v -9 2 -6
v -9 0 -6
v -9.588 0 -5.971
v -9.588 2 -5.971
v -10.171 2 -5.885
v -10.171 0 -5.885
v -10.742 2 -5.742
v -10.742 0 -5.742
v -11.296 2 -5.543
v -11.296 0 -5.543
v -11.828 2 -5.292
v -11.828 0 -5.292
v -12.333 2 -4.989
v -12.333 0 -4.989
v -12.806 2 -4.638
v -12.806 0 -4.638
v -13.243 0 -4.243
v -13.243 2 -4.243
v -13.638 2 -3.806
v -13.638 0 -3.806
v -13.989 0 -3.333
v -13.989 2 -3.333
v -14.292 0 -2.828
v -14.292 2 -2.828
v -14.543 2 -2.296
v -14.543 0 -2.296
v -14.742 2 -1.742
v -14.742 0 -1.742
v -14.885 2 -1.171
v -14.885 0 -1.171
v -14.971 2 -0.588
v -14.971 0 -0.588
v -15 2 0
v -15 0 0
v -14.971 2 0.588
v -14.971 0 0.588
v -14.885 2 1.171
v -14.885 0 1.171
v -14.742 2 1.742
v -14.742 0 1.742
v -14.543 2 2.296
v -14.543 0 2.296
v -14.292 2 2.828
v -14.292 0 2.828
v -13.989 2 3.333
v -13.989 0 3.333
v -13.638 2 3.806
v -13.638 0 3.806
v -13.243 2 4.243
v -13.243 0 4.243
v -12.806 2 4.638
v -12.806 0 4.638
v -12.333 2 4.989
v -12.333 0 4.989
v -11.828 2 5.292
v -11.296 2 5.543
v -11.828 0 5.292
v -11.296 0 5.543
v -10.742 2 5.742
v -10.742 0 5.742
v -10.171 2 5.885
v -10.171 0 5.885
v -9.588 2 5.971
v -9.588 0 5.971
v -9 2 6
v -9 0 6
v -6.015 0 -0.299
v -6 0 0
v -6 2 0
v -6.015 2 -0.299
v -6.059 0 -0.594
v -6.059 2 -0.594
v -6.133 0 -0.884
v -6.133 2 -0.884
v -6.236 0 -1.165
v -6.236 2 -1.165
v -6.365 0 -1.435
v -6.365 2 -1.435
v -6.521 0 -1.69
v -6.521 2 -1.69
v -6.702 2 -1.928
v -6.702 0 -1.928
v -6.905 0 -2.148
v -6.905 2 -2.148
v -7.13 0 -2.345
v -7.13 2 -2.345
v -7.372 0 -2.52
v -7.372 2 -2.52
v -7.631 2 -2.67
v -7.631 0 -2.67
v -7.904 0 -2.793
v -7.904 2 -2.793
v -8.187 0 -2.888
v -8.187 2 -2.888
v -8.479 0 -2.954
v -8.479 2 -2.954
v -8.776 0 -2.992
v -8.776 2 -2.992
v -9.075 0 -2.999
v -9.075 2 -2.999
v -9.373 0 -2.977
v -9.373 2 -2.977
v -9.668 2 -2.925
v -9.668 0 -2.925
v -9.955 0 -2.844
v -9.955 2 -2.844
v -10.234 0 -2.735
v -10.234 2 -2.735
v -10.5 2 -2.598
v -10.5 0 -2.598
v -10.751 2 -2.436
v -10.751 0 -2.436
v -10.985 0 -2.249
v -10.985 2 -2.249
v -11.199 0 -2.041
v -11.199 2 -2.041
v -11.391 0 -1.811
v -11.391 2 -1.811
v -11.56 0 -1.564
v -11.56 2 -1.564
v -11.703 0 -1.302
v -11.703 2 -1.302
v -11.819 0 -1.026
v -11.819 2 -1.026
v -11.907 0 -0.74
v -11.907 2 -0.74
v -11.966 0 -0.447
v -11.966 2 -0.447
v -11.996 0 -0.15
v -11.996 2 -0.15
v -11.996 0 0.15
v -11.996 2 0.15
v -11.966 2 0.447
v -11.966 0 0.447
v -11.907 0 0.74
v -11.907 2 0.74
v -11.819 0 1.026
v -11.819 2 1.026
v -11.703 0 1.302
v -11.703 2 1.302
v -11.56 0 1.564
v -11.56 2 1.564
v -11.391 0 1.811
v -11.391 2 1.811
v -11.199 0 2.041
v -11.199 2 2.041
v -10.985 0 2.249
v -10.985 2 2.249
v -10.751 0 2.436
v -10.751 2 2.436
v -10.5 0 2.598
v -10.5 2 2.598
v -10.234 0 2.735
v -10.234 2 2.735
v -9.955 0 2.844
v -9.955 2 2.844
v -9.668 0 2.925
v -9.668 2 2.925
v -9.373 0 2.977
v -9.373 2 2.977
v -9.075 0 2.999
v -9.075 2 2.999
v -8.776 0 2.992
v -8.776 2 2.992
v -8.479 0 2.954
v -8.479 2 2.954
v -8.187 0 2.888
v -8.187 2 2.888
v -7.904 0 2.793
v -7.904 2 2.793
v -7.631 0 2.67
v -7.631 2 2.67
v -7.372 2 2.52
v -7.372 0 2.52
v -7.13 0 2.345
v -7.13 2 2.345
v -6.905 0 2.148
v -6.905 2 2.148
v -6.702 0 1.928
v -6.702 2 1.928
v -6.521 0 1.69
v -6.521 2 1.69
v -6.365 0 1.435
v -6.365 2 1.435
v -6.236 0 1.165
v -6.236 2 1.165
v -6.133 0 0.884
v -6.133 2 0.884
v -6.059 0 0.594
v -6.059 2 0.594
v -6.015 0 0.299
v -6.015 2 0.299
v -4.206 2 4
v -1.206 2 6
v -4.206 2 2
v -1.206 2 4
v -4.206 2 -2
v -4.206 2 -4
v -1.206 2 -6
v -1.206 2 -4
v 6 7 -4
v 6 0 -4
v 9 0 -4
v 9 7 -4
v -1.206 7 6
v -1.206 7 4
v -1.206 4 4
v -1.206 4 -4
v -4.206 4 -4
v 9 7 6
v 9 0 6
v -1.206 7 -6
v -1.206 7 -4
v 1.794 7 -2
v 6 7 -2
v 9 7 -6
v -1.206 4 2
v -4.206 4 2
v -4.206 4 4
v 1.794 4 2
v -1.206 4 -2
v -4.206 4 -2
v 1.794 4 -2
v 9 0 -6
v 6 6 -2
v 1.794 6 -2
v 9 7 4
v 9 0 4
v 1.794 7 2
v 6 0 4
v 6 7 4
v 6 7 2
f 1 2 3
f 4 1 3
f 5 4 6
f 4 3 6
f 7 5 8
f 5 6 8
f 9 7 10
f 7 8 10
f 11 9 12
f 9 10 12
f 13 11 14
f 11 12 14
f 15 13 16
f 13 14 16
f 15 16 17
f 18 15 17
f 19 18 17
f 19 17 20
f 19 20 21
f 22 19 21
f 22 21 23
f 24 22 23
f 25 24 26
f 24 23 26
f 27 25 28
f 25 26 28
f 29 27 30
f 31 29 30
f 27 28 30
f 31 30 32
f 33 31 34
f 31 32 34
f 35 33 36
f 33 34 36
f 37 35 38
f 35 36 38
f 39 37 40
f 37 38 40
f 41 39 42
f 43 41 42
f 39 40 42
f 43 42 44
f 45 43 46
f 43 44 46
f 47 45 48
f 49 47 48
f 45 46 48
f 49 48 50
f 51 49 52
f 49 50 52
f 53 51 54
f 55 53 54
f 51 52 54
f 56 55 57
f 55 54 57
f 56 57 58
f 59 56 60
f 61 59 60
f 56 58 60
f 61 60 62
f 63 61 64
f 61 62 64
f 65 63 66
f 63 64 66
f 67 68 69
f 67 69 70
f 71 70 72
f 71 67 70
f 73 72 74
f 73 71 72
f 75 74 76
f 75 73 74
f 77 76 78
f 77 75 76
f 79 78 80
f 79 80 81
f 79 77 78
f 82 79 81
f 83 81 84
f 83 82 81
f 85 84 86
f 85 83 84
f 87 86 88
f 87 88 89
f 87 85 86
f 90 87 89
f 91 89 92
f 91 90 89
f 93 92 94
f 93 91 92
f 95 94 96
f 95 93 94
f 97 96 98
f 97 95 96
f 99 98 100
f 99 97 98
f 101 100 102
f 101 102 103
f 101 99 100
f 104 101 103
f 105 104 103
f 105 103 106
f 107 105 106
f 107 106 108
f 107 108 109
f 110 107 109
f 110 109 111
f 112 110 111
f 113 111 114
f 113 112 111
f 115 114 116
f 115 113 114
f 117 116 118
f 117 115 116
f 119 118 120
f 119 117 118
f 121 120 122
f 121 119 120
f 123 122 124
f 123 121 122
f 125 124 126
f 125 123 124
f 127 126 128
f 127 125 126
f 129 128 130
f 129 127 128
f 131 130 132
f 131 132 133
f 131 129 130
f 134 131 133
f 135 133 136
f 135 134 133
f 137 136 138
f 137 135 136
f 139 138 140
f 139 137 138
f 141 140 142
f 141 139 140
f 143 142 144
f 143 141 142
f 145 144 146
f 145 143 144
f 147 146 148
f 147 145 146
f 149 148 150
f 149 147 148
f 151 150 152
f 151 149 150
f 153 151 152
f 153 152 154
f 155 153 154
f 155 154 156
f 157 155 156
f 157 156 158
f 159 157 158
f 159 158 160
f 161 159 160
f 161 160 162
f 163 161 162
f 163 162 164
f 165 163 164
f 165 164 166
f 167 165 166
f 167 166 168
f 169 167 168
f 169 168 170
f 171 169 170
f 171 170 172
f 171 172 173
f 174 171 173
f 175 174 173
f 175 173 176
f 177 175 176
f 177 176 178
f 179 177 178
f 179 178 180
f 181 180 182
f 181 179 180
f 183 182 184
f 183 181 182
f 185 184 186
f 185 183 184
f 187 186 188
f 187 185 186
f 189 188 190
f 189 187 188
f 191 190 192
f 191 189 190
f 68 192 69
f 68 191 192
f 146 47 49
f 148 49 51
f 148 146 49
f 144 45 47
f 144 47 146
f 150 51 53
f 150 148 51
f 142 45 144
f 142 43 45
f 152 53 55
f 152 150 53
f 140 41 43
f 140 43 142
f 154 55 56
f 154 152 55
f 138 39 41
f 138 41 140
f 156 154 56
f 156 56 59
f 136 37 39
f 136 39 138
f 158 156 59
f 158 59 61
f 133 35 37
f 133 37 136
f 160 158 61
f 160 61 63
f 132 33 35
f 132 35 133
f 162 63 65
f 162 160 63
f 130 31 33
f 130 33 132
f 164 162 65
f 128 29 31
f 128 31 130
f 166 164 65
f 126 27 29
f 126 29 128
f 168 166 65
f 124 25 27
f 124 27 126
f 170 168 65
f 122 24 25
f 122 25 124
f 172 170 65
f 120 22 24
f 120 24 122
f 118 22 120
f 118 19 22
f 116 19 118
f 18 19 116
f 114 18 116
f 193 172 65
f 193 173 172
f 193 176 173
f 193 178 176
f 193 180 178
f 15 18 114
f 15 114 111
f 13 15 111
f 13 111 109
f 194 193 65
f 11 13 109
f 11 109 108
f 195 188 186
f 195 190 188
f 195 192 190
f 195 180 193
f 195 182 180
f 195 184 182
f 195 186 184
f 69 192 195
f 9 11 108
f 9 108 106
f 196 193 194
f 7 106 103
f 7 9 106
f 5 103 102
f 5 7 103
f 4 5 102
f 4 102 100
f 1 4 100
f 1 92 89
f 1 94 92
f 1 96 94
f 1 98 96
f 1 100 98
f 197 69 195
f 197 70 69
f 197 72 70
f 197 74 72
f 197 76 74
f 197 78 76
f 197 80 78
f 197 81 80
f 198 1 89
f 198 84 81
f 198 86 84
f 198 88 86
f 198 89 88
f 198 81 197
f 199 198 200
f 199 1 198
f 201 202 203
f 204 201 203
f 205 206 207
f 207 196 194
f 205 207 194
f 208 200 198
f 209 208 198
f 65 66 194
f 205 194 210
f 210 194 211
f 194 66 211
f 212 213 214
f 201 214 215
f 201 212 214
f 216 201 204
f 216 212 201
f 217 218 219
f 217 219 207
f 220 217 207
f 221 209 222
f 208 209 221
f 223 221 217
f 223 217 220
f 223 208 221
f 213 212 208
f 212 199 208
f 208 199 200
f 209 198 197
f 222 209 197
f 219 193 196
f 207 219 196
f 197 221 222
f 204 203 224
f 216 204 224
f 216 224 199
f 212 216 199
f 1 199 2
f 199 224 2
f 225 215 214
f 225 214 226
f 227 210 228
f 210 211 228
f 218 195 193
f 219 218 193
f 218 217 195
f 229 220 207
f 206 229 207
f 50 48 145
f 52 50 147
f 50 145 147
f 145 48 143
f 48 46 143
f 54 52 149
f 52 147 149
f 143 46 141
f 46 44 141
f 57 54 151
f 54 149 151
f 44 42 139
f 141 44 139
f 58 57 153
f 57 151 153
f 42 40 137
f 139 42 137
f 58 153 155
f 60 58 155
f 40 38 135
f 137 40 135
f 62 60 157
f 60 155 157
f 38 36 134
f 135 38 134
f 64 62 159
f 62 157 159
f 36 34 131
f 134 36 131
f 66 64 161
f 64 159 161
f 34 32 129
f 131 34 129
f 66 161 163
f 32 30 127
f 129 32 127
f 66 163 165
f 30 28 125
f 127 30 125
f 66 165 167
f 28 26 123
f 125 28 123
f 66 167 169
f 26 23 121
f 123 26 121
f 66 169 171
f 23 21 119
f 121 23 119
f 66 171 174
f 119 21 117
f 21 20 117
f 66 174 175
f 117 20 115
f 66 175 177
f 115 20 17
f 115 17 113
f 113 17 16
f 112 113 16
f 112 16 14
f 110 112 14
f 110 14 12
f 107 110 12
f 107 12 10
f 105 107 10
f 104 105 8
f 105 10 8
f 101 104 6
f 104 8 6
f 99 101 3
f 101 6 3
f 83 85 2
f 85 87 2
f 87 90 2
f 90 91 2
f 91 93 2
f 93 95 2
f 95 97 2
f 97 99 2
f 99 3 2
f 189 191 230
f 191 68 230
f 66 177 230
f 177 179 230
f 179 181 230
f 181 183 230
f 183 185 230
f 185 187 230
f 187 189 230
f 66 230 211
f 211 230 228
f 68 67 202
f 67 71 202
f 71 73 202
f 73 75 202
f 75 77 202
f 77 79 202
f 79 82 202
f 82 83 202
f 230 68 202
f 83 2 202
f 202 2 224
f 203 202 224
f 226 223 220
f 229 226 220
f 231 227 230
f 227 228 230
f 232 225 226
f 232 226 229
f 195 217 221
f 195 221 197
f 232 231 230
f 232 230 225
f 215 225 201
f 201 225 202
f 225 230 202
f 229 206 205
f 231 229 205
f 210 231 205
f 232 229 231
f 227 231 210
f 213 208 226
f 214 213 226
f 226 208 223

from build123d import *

# Parameters (mm, degrees)
SKETCH1_R           = 3
BOSS_EXTRUDE1_DEPTH = 2
BOSS_EXTRUDE2_DEPTH = 2
CUT_EXTRUDE1_DEPTH  = 2
BOSS_EXTRUDE3_DEPTH = 3
CUT_EXTRUDE2_DEPTH  = 13


with BuildPart() as part:
    # Sketch1 → Boss-Extrude1 (new body)
    with BuildSketch(Plane(origin=(0, 0, 0), x_dir=(1, 0, 0), z_dir=(0, 1, 0))):
        with BuildLine():
            Line((9, 4), (9, 6))
            Line((9, 6), (-9, 6))
            ThreePointArc((-9, 6), (-15, 0), (-9, -6))
            Line((-9, -6), (9, -6))
            Line((9, -6), (9, -4))
            Line((9, -4), (6, -4))
            Line((6, -4), (6, 4))
            Line((6, 4), (9, 4))
        make_face()
        with Locations((-9, 0)):
            Circle(SKETCH1_R, mode=Mode.SUBTRACT)
    extrude(amount=BOSS_EXTRUDE1_DEPTH)

    # Sketch2 → Boss-Extrude2 (add)
    with BuildSketch(Plane(origin=(0, 2, 0), x_dir=(1, 0, 0), z_dir=(0, 1, 0))):
        Polygon((9, 6), (-1.205687829, 6), (-1.205687829, 4), (-4.205687829, 4), (-4.205687829, -4), (-1.205687829, -4), (-1.205687829, -6), (9, -6), (9, -4), (6, -4), (6, 4), (9, 4), align=None)
    extrude(amount=BOSS_EXTRUDE2_DEPTH)

    # Sketch3 → Cut-Extrude1 (cut, symmetric)
    with BuildSketch(Plane.XY):
        Polygon((-1.205687829, 4), (-4.205687829, 2), (-4.205687829, 4), align=None)
    extrude(amount=CUT_EXTRUDE1_DEPTH, both=True, mode=Mode.SUBTRACT)

    # Sketch4 → Boss-Extrude3 (add)
    with BuildSketch(Plane(origin=(0, 4, 0), x_dir=(1, 0, 0), z_dir=(0, 1, 0))):
        Polygon((9, 6), (-1.205687829, 6), (-1.205687829, 4), (1.794312171, 2), (1.794312171, -2), (-1.205687829, -4), (-1.205687829, -6), (9, -6), (9, -4), (6, -4), (6, 4), (9, 4), align=None)
    extrude(amount=BOSS_EXTRUDE3_DEPTH)

    # Sketch5 → Cut-Extrude2 (cut)
    with BuildSketch(Plane(origin=(6, 0, 0), x_dir=(0, 0, -1), z_dir=(1, 0, 0))):
        Polygon((2, 7), (2, 6), (-2, 7), align=None)
    extrude(amount=-CUT_EXTRUDE2_DEPTH, mode=Mode.SUBTRACT)


solid = part.part
